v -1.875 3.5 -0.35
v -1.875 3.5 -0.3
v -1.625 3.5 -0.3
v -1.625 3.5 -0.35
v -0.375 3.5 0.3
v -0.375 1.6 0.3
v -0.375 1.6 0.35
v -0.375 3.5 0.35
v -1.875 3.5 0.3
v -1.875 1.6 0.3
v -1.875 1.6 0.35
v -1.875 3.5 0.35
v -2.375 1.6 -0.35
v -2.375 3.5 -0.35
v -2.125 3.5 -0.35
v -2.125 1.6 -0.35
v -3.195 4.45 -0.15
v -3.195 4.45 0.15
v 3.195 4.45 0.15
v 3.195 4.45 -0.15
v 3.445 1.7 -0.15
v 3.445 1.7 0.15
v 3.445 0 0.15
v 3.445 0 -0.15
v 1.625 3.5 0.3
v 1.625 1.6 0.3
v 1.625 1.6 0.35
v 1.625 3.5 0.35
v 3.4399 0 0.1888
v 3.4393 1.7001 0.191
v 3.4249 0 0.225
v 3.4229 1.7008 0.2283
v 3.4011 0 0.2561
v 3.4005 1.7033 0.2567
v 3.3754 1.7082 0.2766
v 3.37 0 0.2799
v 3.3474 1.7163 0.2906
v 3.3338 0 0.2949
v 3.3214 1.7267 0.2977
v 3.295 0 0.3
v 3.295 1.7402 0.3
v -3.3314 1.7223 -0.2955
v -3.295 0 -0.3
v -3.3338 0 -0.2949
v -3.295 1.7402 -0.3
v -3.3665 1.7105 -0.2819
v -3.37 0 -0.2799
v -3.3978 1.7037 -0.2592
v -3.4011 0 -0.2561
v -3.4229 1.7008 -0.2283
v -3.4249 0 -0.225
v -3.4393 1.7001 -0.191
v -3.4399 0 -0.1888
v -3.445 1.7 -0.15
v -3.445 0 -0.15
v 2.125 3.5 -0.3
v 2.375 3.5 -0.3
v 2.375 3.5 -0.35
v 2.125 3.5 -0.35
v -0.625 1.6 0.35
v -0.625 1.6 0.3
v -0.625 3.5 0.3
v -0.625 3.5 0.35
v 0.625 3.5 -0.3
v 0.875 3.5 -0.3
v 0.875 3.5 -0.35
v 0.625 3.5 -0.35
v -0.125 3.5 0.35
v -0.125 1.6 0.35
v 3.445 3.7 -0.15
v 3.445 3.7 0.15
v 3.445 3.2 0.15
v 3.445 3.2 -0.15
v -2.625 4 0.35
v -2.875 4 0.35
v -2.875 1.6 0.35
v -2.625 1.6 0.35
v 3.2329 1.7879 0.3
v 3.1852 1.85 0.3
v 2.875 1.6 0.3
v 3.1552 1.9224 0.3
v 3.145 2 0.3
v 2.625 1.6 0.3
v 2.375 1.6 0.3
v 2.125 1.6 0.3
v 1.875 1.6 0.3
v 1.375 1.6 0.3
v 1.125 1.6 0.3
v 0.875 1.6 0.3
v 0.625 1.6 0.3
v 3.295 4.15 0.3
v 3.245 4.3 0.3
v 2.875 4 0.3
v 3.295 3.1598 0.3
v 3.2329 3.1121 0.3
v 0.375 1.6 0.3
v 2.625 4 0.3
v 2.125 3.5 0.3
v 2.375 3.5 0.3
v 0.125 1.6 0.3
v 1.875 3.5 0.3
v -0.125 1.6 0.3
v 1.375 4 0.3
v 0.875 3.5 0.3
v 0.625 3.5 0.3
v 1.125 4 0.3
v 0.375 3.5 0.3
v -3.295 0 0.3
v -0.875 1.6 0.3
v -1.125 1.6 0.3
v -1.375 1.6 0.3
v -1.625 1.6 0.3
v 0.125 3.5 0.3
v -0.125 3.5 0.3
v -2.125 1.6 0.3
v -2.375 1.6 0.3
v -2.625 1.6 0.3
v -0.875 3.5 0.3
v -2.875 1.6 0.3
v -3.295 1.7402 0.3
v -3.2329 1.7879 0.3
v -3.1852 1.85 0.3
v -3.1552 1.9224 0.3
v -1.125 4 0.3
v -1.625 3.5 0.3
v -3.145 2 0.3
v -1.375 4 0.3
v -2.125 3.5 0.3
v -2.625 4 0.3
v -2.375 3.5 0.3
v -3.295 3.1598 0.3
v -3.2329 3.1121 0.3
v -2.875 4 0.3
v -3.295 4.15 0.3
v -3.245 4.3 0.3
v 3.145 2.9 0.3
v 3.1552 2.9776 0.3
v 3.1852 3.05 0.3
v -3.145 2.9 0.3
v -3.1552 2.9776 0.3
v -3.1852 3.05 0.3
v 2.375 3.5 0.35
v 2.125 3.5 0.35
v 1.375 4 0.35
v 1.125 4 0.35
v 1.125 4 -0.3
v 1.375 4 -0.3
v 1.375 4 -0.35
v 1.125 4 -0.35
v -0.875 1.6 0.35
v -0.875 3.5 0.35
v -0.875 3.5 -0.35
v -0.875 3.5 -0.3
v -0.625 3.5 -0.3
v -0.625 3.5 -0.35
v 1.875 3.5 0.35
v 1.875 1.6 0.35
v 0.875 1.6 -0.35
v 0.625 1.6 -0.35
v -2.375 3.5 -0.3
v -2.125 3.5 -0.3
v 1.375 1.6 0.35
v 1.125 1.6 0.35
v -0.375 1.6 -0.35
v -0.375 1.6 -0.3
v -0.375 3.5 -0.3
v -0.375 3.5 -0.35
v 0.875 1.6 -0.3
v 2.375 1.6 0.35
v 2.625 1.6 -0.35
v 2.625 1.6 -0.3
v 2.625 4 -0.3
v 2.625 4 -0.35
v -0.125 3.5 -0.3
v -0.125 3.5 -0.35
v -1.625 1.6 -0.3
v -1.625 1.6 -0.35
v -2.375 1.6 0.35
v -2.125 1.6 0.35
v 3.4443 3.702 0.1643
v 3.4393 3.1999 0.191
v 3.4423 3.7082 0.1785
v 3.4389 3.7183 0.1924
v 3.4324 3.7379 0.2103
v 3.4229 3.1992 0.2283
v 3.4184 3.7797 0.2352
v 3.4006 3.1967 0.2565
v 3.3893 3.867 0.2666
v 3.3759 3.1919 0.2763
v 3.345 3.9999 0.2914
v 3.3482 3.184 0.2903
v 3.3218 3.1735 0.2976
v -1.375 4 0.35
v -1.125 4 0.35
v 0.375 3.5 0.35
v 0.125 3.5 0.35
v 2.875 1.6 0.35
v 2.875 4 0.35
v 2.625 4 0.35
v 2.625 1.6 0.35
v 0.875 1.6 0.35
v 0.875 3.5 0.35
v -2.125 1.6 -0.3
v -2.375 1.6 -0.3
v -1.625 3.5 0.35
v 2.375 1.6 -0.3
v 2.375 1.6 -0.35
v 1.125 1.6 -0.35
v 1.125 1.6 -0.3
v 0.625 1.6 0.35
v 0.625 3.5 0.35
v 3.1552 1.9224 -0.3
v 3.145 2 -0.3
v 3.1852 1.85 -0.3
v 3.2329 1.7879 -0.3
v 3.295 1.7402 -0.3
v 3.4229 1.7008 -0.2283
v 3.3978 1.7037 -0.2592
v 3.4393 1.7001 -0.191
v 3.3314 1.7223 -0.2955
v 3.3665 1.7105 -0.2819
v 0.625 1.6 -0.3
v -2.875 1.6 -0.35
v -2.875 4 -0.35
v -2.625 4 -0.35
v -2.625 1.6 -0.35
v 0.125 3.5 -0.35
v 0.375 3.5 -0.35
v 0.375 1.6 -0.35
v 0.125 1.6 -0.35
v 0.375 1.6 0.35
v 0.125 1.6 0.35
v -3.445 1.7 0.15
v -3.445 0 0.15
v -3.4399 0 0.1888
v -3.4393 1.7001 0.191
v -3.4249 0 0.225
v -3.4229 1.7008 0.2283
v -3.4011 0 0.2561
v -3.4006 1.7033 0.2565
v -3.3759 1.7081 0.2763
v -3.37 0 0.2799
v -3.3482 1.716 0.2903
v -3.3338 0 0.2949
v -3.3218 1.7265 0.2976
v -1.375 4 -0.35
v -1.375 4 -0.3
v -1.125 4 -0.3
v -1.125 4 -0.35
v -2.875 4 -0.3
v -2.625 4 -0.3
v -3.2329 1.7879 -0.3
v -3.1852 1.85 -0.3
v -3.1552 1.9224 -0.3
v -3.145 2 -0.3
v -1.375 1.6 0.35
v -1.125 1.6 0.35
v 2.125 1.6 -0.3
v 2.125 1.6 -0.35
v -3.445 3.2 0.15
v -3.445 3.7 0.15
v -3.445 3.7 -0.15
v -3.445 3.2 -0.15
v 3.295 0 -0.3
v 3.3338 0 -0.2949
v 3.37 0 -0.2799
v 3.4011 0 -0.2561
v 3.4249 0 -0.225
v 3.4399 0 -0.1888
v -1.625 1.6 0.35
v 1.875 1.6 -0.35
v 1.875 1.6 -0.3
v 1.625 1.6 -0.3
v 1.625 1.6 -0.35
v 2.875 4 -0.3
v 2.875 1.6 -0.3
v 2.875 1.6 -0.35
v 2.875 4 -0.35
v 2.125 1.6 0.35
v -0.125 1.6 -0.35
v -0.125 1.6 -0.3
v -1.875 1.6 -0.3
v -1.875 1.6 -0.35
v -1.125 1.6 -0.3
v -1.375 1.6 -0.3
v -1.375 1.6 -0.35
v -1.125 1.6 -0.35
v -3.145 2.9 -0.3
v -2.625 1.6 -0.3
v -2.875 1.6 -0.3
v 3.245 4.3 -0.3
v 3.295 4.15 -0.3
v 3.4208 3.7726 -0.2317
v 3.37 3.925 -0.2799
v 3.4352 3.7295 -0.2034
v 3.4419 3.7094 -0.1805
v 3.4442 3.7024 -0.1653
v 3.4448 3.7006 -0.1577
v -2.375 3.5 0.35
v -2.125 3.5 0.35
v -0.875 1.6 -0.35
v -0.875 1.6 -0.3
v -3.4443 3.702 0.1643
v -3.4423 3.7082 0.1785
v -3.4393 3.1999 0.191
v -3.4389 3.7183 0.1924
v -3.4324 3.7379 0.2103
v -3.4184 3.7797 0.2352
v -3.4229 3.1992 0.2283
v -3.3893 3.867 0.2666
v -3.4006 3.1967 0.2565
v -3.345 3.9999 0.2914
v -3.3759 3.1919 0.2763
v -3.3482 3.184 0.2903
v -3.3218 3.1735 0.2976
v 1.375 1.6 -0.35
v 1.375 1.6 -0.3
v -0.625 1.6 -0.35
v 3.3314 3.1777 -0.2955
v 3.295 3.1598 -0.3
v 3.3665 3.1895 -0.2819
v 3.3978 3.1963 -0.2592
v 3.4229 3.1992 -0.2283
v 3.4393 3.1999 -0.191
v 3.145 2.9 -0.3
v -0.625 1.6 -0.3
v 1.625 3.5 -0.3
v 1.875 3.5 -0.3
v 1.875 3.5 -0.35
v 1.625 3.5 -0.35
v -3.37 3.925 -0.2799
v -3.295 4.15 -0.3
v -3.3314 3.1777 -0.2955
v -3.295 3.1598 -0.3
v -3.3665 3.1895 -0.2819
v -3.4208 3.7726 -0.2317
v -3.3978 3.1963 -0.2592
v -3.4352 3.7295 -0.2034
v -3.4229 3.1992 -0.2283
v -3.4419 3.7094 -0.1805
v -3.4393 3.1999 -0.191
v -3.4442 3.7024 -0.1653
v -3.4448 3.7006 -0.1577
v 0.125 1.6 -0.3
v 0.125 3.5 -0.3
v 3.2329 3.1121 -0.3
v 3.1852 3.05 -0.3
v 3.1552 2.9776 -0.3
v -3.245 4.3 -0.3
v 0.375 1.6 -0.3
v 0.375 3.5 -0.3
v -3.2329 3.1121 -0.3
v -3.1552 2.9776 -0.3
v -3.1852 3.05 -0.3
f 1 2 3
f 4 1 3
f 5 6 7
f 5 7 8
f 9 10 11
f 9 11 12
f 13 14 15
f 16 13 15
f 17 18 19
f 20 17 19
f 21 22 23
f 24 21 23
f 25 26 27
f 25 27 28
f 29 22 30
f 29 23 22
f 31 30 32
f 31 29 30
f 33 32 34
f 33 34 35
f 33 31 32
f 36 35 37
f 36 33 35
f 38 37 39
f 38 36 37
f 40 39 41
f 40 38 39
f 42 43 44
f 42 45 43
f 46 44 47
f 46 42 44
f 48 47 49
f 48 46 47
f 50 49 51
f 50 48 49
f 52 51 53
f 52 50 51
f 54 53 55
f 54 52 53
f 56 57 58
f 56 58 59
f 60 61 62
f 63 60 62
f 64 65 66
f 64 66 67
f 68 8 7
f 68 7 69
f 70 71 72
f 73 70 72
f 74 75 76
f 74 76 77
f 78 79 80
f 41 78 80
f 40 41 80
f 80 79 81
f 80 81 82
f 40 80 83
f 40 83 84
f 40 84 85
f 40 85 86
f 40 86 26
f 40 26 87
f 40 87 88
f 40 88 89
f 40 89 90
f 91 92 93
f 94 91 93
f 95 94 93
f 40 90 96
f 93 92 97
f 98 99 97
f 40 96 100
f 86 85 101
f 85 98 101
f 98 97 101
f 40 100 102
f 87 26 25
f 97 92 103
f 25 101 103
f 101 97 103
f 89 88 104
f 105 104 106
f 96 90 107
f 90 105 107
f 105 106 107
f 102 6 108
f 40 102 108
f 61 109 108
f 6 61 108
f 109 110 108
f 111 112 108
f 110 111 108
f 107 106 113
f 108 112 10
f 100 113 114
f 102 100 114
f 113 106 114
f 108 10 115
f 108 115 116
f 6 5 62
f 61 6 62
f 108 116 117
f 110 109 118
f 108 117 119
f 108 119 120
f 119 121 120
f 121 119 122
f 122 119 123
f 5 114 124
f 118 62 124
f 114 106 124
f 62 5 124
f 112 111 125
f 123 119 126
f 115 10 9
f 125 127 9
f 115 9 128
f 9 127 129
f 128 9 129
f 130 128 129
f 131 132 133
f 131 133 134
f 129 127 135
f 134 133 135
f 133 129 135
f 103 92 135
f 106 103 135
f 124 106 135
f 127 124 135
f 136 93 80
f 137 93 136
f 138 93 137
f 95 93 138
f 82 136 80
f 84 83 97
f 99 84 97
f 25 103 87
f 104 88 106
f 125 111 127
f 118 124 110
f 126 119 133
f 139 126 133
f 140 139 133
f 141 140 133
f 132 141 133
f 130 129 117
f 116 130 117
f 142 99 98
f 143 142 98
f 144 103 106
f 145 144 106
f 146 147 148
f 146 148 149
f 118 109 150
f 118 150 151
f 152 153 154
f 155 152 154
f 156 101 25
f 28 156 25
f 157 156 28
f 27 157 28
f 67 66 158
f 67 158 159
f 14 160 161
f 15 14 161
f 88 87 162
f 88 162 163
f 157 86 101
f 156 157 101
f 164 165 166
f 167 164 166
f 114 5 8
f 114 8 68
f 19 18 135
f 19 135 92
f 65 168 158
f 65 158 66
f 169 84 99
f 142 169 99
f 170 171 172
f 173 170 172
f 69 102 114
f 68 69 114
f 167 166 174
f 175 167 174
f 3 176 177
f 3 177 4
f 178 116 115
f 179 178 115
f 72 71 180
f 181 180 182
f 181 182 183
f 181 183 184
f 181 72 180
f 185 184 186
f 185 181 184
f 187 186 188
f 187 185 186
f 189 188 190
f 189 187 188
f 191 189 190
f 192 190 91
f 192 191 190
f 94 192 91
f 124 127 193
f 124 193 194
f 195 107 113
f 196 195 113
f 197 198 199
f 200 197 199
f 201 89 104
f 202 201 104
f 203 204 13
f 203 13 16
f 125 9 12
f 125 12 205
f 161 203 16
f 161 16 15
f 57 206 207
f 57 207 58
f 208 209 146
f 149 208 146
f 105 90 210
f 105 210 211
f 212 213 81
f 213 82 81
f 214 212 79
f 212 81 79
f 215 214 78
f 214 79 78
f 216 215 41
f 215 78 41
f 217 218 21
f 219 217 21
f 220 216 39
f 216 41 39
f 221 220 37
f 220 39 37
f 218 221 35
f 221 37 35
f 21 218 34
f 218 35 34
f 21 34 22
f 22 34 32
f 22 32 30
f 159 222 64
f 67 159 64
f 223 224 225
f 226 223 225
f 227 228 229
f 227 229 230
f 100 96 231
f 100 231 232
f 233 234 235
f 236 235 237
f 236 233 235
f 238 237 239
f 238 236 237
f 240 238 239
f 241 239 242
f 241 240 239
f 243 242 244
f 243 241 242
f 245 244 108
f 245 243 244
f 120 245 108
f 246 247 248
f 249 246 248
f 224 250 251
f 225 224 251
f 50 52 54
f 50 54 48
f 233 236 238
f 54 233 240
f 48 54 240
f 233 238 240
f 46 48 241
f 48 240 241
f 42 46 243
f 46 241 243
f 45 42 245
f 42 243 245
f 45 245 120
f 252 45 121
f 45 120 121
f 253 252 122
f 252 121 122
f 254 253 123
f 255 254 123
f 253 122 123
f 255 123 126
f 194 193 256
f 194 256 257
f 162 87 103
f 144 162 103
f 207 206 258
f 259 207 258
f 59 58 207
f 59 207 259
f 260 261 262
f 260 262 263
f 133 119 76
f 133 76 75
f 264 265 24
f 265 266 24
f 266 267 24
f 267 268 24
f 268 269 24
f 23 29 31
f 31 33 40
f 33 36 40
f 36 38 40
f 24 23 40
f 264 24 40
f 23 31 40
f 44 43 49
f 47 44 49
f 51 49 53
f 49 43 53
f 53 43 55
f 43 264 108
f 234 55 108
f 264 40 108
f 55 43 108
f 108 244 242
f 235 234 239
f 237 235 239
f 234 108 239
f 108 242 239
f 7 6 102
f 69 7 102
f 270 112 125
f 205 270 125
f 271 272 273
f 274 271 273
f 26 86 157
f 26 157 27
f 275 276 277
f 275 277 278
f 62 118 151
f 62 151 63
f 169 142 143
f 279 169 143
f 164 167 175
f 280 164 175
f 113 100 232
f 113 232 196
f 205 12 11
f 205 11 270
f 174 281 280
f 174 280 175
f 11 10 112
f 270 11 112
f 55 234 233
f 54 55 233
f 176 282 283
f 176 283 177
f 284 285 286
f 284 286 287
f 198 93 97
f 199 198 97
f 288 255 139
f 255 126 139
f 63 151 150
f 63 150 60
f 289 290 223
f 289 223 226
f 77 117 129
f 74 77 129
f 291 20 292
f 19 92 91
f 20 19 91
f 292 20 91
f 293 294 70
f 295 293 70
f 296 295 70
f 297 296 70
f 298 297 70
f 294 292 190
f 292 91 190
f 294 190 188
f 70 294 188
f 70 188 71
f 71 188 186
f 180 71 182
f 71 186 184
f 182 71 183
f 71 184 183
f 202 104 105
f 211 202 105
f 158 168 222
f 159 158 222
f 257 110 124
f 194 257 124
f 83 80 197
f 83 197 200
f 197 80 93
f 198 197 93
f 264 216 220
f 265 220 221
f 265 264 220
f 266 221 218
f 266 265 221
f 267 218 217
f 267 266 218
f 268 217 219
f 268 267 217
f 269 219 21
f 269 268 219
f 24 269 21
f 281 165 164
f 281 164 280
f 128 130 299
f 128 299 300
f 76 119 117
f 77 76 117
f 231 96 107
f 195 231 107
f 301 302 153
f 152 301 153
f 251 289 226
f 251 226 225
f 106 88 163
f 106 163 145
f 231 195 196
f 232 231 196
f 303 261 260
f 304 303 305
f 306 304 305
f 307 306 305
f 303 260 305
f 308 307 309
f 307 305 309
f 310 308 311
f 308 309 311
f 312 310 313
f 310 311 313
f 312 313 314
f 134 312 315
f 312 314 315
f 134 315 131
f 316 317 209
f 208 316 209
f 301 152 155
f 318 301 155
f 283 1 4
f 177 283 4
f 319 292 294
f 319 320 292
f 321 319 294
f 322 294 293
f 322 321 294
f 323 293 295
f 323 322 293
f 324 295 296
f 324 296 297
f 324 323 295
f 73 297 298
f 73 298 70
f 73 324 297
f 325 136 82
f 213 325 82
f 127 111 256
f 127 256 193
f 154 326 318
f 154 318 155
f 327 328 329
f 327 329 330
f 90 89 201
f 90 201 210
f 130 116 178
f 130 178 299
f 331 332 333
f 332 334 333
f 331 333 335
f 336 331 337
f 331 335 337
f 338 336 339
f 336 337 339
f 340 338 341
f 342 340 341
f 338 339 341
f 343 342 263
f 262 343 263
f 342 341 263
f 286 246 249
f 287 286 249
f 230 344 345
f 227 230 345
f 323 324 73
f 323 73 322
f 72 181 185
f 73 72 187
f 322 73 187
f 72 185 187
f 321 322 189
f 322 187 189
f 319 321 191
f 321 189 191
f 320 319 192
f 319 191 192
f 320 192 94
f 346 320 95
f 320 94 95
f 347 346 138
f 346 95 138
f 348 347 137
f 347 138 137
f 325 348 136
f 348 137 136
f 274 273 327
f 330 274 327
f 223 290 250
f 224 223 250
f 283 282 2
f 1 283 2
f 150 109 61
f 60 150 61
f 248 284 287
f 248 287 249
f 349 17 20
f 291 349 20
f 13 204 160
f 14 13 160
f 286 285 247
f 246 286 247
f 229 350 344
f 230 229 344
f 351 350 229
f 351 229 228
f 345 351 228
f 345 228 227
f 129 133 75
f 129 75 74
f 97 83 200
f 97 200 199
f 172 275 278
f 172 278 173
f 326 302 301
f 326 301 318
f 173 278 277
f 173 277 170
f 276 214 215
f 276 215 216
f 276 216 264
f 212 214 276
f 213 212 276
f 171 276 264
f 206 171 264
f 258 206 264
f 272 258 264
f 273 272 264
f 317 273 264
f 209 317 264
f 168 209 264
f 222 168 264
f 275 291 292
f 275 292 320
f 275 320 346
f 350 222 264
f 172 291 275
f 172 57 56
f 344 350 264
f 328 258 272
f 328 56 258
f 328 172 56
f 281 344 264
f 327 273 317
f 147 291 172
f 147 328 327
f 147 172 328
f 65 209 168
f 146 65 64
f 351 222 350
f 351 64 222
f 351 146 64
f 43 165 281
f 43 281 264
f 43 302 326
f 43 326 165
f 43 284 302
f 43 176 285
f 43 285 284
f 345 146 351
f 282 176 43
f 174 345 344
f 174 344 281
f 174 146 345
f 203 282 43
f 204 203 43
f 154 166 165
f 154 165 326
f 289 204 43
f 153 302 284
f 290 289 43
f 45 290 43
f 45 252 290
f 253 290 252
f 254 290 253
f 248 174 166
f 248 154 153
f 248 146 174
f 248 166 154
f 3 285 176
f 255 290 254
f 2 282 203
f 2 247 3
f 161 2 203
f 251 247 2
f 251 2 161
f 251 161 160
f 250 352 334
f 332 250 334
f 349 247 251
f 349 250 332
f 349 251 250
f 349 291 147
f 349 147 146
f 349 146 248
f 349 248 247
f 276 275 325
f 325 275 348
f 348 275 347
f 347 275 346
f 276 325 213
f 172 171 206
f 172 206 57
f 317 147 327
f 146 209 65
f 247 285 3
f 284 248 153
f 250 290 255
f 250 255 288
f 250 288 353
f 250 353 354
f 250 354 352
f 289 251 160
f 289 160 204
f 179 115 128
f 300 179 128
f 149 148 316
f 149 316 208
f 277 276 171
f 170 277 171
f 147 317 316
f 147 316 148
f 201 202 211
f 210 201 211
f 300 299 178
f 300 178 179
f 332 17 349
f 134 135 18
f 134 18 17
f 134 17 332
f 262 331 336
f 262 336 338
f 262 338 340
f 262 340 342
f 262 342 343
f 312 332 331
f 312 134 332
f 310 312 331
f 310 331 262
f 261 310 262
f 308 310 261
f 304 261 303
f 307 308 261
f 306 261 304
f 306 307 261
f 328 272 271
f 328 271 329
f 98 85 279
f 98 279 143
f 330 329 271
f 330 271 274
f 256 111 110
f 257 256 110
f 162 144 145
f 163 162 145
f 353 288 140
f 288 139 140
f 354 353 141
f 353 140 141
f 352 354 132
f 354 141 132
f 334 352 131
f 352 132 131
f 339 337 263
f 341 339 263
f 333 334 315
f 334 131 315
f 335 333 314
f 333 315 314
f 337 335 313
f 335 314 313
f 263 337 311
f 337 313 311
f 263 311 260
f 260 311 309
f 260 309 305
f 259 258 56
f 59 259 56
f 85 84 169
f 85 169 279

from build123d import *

# Parameters (mm, degrees)
PAD004_DEPTH             = 0.3
SKETCH003_W              = 0.25
SKETCH003_H              = 2.4
SKETCH003_H_2            = 1.9
PAD011_DEPTH             = 0.05
SKETCH003_MIRRORED_2_W   = 0.25
SKETCH003_MIRRORED_2_H   = 2.4
SKETCH003_MIRRORED_2_H_2 = 1.9
PAD011_MIRRORED_2_DEPTH  = 0.05
CHAMFER_SIZE             = 0.15
FILLET_R                 = 0.15


with BuildPart() as part:
    # Sketch001 → Pad004 (new body, symmetric)
    with BuildSketch(Plane.XY):
        with BuildLine():
            Line((3.445, 1.7), (3.445, 0))
            Line((3.445, 0), (-3.445, 0))
            Line((-3.445, 0), (-3.445, 1.7))
            ThreePointArc((-3.445, 1.7), (-3.232868, 1.787868), (-3.145, 2))
            Line((-3.145, 2), (-3.145, 2.9))
            ThreePointArc((-3.145, 2.9), (-3.232868, 3.112132), (-3.445, 3.2))
            Line((-3.445, 3.7), (-3.445, 3.2))
            Line((-3.195, 4.45), (-3.445, 3.7))
            Line((-3.195, 4.45), (3.195, 4.45))
            Line((3.195, 4.45), (3.445, 3.7))
            Line((3.445, 3.7), (3.445, 3.2))
            ThreePointArc((3.445, 3.2), (3.232868, 3.112132), (3.145, 2.9))
            Line((3.145, 2.9), (3.145, 2))
            ThreePointArc((3.145, 2), (3.232868, 1.787868), (3.445, 1.7))
        make_face()
    extrude(amount=PAD004_DEPTH, both=True)

    # Sketch003 (on Face16 of Pad004) → Pad011 (join)
    with BuildSketch(Plane.XY.offset(0.3)):
        with Locations((-2.75, 2.8)):
            Rectangle(SKETCH003_W, SKETCH003_H)
        with Locations((-1.25, 2.8)):
            Rectangle(SKETCH003_W, SKETCH003_H)
        with Locations((-2.25, 2.55)):
            Rectangle(SKETCH003_W, SKETCH003_H_2)
        with Locations((-1.75, 2.55)):
            Rectangle(SKETCH003_W, SKETCH003_H_2)
        with Locations((-0.75, 2.55)):
            Rectangle(SKETCH003_W, SKETCH003_H_2)
        with Locations((-0.25, 2.55)):
            Rectangle(SKETCH003_W, SKETCH003_H_2)
    pad011 = extrude(amount=PAD011_DEPTH)

    # Sketch003 Mirrored 2 → Pad011 Mirrored 2 (add)
    with BuildSketch(Plane(origin=(0, 0, 0.3), x_dir=(-1, 0, 0), z_dir=(0, 0, -1))):
        with Locations((-2.75, 2.8)):
            Rectangle(SKETCH003_MIRRORED_2_W, SKETCH003_MIRRORED_2_H)
        with Locations((-1.25, 2.8)):
            Rectangle(SKETCH003_MIRRORED_2_W, SKETCH003_MIRRORED_2_H)
        with Locations((-2.25, 2.55)):
            Rectangle(SKETCH003_MIRRORED_2_W, SKETCH003_MIRRORED_2_H_2)
        with Locations((-1.75, 2.55)):
            Rectangle(SKETCH003_MIRRORED_2_W, SKETCH003_MIRRORED_2_H_2)
        with Locations((-0.75, 2.55)):
            Rectangle(SKETCH003_MIRRORED_2_W, SKETCH003_MIRRORED_2_H_2)
        with Locations((-0.25, 2.55)):
            Rectangle(SKETCH003_MIRRORED_2_W, SKETCH003_MIRRORED_2_H_2)
    pad011_mirrored_2 = extrude(amount=-PAD011_MIRRORED_2_DEPTH)

    # Mirrored001: Pad011, Pad011 Mirrored 2 across XY
    add(pad011.mirror(Plane.XY))
    add(pad011_mirrored_2.mirror(Plane.XY))

    # Chamfer
    chamfer_edges = [part.edges().sort_by_distance(p)[0] for p in [
        (0, 4.45, -0.3),
        (0, 4.45, 0.3),
    ]]
    chamfer(chamfer_edges, length=CHAMFER_SIZE)

    # Fillet
    fillet_edges = [part.edges().sort_by_distance(p)[0] for p in [
        (-3.445, 3.45, 0.3),
        (-3.445, 3.45, -0.3),
        (-3.445, 0.85, 0.3),
        (-3.445, 0.85, -0.3),
        (3.445, 0.85, 0.3),
        (3.445, 0.85, -0.3),
        (3.445, 3.45, 0.3),
        (3.445, 3.45, -0.3),
    ]]
    fillet(fillet_edges, radius=FILLET_R)


solid = part.part
